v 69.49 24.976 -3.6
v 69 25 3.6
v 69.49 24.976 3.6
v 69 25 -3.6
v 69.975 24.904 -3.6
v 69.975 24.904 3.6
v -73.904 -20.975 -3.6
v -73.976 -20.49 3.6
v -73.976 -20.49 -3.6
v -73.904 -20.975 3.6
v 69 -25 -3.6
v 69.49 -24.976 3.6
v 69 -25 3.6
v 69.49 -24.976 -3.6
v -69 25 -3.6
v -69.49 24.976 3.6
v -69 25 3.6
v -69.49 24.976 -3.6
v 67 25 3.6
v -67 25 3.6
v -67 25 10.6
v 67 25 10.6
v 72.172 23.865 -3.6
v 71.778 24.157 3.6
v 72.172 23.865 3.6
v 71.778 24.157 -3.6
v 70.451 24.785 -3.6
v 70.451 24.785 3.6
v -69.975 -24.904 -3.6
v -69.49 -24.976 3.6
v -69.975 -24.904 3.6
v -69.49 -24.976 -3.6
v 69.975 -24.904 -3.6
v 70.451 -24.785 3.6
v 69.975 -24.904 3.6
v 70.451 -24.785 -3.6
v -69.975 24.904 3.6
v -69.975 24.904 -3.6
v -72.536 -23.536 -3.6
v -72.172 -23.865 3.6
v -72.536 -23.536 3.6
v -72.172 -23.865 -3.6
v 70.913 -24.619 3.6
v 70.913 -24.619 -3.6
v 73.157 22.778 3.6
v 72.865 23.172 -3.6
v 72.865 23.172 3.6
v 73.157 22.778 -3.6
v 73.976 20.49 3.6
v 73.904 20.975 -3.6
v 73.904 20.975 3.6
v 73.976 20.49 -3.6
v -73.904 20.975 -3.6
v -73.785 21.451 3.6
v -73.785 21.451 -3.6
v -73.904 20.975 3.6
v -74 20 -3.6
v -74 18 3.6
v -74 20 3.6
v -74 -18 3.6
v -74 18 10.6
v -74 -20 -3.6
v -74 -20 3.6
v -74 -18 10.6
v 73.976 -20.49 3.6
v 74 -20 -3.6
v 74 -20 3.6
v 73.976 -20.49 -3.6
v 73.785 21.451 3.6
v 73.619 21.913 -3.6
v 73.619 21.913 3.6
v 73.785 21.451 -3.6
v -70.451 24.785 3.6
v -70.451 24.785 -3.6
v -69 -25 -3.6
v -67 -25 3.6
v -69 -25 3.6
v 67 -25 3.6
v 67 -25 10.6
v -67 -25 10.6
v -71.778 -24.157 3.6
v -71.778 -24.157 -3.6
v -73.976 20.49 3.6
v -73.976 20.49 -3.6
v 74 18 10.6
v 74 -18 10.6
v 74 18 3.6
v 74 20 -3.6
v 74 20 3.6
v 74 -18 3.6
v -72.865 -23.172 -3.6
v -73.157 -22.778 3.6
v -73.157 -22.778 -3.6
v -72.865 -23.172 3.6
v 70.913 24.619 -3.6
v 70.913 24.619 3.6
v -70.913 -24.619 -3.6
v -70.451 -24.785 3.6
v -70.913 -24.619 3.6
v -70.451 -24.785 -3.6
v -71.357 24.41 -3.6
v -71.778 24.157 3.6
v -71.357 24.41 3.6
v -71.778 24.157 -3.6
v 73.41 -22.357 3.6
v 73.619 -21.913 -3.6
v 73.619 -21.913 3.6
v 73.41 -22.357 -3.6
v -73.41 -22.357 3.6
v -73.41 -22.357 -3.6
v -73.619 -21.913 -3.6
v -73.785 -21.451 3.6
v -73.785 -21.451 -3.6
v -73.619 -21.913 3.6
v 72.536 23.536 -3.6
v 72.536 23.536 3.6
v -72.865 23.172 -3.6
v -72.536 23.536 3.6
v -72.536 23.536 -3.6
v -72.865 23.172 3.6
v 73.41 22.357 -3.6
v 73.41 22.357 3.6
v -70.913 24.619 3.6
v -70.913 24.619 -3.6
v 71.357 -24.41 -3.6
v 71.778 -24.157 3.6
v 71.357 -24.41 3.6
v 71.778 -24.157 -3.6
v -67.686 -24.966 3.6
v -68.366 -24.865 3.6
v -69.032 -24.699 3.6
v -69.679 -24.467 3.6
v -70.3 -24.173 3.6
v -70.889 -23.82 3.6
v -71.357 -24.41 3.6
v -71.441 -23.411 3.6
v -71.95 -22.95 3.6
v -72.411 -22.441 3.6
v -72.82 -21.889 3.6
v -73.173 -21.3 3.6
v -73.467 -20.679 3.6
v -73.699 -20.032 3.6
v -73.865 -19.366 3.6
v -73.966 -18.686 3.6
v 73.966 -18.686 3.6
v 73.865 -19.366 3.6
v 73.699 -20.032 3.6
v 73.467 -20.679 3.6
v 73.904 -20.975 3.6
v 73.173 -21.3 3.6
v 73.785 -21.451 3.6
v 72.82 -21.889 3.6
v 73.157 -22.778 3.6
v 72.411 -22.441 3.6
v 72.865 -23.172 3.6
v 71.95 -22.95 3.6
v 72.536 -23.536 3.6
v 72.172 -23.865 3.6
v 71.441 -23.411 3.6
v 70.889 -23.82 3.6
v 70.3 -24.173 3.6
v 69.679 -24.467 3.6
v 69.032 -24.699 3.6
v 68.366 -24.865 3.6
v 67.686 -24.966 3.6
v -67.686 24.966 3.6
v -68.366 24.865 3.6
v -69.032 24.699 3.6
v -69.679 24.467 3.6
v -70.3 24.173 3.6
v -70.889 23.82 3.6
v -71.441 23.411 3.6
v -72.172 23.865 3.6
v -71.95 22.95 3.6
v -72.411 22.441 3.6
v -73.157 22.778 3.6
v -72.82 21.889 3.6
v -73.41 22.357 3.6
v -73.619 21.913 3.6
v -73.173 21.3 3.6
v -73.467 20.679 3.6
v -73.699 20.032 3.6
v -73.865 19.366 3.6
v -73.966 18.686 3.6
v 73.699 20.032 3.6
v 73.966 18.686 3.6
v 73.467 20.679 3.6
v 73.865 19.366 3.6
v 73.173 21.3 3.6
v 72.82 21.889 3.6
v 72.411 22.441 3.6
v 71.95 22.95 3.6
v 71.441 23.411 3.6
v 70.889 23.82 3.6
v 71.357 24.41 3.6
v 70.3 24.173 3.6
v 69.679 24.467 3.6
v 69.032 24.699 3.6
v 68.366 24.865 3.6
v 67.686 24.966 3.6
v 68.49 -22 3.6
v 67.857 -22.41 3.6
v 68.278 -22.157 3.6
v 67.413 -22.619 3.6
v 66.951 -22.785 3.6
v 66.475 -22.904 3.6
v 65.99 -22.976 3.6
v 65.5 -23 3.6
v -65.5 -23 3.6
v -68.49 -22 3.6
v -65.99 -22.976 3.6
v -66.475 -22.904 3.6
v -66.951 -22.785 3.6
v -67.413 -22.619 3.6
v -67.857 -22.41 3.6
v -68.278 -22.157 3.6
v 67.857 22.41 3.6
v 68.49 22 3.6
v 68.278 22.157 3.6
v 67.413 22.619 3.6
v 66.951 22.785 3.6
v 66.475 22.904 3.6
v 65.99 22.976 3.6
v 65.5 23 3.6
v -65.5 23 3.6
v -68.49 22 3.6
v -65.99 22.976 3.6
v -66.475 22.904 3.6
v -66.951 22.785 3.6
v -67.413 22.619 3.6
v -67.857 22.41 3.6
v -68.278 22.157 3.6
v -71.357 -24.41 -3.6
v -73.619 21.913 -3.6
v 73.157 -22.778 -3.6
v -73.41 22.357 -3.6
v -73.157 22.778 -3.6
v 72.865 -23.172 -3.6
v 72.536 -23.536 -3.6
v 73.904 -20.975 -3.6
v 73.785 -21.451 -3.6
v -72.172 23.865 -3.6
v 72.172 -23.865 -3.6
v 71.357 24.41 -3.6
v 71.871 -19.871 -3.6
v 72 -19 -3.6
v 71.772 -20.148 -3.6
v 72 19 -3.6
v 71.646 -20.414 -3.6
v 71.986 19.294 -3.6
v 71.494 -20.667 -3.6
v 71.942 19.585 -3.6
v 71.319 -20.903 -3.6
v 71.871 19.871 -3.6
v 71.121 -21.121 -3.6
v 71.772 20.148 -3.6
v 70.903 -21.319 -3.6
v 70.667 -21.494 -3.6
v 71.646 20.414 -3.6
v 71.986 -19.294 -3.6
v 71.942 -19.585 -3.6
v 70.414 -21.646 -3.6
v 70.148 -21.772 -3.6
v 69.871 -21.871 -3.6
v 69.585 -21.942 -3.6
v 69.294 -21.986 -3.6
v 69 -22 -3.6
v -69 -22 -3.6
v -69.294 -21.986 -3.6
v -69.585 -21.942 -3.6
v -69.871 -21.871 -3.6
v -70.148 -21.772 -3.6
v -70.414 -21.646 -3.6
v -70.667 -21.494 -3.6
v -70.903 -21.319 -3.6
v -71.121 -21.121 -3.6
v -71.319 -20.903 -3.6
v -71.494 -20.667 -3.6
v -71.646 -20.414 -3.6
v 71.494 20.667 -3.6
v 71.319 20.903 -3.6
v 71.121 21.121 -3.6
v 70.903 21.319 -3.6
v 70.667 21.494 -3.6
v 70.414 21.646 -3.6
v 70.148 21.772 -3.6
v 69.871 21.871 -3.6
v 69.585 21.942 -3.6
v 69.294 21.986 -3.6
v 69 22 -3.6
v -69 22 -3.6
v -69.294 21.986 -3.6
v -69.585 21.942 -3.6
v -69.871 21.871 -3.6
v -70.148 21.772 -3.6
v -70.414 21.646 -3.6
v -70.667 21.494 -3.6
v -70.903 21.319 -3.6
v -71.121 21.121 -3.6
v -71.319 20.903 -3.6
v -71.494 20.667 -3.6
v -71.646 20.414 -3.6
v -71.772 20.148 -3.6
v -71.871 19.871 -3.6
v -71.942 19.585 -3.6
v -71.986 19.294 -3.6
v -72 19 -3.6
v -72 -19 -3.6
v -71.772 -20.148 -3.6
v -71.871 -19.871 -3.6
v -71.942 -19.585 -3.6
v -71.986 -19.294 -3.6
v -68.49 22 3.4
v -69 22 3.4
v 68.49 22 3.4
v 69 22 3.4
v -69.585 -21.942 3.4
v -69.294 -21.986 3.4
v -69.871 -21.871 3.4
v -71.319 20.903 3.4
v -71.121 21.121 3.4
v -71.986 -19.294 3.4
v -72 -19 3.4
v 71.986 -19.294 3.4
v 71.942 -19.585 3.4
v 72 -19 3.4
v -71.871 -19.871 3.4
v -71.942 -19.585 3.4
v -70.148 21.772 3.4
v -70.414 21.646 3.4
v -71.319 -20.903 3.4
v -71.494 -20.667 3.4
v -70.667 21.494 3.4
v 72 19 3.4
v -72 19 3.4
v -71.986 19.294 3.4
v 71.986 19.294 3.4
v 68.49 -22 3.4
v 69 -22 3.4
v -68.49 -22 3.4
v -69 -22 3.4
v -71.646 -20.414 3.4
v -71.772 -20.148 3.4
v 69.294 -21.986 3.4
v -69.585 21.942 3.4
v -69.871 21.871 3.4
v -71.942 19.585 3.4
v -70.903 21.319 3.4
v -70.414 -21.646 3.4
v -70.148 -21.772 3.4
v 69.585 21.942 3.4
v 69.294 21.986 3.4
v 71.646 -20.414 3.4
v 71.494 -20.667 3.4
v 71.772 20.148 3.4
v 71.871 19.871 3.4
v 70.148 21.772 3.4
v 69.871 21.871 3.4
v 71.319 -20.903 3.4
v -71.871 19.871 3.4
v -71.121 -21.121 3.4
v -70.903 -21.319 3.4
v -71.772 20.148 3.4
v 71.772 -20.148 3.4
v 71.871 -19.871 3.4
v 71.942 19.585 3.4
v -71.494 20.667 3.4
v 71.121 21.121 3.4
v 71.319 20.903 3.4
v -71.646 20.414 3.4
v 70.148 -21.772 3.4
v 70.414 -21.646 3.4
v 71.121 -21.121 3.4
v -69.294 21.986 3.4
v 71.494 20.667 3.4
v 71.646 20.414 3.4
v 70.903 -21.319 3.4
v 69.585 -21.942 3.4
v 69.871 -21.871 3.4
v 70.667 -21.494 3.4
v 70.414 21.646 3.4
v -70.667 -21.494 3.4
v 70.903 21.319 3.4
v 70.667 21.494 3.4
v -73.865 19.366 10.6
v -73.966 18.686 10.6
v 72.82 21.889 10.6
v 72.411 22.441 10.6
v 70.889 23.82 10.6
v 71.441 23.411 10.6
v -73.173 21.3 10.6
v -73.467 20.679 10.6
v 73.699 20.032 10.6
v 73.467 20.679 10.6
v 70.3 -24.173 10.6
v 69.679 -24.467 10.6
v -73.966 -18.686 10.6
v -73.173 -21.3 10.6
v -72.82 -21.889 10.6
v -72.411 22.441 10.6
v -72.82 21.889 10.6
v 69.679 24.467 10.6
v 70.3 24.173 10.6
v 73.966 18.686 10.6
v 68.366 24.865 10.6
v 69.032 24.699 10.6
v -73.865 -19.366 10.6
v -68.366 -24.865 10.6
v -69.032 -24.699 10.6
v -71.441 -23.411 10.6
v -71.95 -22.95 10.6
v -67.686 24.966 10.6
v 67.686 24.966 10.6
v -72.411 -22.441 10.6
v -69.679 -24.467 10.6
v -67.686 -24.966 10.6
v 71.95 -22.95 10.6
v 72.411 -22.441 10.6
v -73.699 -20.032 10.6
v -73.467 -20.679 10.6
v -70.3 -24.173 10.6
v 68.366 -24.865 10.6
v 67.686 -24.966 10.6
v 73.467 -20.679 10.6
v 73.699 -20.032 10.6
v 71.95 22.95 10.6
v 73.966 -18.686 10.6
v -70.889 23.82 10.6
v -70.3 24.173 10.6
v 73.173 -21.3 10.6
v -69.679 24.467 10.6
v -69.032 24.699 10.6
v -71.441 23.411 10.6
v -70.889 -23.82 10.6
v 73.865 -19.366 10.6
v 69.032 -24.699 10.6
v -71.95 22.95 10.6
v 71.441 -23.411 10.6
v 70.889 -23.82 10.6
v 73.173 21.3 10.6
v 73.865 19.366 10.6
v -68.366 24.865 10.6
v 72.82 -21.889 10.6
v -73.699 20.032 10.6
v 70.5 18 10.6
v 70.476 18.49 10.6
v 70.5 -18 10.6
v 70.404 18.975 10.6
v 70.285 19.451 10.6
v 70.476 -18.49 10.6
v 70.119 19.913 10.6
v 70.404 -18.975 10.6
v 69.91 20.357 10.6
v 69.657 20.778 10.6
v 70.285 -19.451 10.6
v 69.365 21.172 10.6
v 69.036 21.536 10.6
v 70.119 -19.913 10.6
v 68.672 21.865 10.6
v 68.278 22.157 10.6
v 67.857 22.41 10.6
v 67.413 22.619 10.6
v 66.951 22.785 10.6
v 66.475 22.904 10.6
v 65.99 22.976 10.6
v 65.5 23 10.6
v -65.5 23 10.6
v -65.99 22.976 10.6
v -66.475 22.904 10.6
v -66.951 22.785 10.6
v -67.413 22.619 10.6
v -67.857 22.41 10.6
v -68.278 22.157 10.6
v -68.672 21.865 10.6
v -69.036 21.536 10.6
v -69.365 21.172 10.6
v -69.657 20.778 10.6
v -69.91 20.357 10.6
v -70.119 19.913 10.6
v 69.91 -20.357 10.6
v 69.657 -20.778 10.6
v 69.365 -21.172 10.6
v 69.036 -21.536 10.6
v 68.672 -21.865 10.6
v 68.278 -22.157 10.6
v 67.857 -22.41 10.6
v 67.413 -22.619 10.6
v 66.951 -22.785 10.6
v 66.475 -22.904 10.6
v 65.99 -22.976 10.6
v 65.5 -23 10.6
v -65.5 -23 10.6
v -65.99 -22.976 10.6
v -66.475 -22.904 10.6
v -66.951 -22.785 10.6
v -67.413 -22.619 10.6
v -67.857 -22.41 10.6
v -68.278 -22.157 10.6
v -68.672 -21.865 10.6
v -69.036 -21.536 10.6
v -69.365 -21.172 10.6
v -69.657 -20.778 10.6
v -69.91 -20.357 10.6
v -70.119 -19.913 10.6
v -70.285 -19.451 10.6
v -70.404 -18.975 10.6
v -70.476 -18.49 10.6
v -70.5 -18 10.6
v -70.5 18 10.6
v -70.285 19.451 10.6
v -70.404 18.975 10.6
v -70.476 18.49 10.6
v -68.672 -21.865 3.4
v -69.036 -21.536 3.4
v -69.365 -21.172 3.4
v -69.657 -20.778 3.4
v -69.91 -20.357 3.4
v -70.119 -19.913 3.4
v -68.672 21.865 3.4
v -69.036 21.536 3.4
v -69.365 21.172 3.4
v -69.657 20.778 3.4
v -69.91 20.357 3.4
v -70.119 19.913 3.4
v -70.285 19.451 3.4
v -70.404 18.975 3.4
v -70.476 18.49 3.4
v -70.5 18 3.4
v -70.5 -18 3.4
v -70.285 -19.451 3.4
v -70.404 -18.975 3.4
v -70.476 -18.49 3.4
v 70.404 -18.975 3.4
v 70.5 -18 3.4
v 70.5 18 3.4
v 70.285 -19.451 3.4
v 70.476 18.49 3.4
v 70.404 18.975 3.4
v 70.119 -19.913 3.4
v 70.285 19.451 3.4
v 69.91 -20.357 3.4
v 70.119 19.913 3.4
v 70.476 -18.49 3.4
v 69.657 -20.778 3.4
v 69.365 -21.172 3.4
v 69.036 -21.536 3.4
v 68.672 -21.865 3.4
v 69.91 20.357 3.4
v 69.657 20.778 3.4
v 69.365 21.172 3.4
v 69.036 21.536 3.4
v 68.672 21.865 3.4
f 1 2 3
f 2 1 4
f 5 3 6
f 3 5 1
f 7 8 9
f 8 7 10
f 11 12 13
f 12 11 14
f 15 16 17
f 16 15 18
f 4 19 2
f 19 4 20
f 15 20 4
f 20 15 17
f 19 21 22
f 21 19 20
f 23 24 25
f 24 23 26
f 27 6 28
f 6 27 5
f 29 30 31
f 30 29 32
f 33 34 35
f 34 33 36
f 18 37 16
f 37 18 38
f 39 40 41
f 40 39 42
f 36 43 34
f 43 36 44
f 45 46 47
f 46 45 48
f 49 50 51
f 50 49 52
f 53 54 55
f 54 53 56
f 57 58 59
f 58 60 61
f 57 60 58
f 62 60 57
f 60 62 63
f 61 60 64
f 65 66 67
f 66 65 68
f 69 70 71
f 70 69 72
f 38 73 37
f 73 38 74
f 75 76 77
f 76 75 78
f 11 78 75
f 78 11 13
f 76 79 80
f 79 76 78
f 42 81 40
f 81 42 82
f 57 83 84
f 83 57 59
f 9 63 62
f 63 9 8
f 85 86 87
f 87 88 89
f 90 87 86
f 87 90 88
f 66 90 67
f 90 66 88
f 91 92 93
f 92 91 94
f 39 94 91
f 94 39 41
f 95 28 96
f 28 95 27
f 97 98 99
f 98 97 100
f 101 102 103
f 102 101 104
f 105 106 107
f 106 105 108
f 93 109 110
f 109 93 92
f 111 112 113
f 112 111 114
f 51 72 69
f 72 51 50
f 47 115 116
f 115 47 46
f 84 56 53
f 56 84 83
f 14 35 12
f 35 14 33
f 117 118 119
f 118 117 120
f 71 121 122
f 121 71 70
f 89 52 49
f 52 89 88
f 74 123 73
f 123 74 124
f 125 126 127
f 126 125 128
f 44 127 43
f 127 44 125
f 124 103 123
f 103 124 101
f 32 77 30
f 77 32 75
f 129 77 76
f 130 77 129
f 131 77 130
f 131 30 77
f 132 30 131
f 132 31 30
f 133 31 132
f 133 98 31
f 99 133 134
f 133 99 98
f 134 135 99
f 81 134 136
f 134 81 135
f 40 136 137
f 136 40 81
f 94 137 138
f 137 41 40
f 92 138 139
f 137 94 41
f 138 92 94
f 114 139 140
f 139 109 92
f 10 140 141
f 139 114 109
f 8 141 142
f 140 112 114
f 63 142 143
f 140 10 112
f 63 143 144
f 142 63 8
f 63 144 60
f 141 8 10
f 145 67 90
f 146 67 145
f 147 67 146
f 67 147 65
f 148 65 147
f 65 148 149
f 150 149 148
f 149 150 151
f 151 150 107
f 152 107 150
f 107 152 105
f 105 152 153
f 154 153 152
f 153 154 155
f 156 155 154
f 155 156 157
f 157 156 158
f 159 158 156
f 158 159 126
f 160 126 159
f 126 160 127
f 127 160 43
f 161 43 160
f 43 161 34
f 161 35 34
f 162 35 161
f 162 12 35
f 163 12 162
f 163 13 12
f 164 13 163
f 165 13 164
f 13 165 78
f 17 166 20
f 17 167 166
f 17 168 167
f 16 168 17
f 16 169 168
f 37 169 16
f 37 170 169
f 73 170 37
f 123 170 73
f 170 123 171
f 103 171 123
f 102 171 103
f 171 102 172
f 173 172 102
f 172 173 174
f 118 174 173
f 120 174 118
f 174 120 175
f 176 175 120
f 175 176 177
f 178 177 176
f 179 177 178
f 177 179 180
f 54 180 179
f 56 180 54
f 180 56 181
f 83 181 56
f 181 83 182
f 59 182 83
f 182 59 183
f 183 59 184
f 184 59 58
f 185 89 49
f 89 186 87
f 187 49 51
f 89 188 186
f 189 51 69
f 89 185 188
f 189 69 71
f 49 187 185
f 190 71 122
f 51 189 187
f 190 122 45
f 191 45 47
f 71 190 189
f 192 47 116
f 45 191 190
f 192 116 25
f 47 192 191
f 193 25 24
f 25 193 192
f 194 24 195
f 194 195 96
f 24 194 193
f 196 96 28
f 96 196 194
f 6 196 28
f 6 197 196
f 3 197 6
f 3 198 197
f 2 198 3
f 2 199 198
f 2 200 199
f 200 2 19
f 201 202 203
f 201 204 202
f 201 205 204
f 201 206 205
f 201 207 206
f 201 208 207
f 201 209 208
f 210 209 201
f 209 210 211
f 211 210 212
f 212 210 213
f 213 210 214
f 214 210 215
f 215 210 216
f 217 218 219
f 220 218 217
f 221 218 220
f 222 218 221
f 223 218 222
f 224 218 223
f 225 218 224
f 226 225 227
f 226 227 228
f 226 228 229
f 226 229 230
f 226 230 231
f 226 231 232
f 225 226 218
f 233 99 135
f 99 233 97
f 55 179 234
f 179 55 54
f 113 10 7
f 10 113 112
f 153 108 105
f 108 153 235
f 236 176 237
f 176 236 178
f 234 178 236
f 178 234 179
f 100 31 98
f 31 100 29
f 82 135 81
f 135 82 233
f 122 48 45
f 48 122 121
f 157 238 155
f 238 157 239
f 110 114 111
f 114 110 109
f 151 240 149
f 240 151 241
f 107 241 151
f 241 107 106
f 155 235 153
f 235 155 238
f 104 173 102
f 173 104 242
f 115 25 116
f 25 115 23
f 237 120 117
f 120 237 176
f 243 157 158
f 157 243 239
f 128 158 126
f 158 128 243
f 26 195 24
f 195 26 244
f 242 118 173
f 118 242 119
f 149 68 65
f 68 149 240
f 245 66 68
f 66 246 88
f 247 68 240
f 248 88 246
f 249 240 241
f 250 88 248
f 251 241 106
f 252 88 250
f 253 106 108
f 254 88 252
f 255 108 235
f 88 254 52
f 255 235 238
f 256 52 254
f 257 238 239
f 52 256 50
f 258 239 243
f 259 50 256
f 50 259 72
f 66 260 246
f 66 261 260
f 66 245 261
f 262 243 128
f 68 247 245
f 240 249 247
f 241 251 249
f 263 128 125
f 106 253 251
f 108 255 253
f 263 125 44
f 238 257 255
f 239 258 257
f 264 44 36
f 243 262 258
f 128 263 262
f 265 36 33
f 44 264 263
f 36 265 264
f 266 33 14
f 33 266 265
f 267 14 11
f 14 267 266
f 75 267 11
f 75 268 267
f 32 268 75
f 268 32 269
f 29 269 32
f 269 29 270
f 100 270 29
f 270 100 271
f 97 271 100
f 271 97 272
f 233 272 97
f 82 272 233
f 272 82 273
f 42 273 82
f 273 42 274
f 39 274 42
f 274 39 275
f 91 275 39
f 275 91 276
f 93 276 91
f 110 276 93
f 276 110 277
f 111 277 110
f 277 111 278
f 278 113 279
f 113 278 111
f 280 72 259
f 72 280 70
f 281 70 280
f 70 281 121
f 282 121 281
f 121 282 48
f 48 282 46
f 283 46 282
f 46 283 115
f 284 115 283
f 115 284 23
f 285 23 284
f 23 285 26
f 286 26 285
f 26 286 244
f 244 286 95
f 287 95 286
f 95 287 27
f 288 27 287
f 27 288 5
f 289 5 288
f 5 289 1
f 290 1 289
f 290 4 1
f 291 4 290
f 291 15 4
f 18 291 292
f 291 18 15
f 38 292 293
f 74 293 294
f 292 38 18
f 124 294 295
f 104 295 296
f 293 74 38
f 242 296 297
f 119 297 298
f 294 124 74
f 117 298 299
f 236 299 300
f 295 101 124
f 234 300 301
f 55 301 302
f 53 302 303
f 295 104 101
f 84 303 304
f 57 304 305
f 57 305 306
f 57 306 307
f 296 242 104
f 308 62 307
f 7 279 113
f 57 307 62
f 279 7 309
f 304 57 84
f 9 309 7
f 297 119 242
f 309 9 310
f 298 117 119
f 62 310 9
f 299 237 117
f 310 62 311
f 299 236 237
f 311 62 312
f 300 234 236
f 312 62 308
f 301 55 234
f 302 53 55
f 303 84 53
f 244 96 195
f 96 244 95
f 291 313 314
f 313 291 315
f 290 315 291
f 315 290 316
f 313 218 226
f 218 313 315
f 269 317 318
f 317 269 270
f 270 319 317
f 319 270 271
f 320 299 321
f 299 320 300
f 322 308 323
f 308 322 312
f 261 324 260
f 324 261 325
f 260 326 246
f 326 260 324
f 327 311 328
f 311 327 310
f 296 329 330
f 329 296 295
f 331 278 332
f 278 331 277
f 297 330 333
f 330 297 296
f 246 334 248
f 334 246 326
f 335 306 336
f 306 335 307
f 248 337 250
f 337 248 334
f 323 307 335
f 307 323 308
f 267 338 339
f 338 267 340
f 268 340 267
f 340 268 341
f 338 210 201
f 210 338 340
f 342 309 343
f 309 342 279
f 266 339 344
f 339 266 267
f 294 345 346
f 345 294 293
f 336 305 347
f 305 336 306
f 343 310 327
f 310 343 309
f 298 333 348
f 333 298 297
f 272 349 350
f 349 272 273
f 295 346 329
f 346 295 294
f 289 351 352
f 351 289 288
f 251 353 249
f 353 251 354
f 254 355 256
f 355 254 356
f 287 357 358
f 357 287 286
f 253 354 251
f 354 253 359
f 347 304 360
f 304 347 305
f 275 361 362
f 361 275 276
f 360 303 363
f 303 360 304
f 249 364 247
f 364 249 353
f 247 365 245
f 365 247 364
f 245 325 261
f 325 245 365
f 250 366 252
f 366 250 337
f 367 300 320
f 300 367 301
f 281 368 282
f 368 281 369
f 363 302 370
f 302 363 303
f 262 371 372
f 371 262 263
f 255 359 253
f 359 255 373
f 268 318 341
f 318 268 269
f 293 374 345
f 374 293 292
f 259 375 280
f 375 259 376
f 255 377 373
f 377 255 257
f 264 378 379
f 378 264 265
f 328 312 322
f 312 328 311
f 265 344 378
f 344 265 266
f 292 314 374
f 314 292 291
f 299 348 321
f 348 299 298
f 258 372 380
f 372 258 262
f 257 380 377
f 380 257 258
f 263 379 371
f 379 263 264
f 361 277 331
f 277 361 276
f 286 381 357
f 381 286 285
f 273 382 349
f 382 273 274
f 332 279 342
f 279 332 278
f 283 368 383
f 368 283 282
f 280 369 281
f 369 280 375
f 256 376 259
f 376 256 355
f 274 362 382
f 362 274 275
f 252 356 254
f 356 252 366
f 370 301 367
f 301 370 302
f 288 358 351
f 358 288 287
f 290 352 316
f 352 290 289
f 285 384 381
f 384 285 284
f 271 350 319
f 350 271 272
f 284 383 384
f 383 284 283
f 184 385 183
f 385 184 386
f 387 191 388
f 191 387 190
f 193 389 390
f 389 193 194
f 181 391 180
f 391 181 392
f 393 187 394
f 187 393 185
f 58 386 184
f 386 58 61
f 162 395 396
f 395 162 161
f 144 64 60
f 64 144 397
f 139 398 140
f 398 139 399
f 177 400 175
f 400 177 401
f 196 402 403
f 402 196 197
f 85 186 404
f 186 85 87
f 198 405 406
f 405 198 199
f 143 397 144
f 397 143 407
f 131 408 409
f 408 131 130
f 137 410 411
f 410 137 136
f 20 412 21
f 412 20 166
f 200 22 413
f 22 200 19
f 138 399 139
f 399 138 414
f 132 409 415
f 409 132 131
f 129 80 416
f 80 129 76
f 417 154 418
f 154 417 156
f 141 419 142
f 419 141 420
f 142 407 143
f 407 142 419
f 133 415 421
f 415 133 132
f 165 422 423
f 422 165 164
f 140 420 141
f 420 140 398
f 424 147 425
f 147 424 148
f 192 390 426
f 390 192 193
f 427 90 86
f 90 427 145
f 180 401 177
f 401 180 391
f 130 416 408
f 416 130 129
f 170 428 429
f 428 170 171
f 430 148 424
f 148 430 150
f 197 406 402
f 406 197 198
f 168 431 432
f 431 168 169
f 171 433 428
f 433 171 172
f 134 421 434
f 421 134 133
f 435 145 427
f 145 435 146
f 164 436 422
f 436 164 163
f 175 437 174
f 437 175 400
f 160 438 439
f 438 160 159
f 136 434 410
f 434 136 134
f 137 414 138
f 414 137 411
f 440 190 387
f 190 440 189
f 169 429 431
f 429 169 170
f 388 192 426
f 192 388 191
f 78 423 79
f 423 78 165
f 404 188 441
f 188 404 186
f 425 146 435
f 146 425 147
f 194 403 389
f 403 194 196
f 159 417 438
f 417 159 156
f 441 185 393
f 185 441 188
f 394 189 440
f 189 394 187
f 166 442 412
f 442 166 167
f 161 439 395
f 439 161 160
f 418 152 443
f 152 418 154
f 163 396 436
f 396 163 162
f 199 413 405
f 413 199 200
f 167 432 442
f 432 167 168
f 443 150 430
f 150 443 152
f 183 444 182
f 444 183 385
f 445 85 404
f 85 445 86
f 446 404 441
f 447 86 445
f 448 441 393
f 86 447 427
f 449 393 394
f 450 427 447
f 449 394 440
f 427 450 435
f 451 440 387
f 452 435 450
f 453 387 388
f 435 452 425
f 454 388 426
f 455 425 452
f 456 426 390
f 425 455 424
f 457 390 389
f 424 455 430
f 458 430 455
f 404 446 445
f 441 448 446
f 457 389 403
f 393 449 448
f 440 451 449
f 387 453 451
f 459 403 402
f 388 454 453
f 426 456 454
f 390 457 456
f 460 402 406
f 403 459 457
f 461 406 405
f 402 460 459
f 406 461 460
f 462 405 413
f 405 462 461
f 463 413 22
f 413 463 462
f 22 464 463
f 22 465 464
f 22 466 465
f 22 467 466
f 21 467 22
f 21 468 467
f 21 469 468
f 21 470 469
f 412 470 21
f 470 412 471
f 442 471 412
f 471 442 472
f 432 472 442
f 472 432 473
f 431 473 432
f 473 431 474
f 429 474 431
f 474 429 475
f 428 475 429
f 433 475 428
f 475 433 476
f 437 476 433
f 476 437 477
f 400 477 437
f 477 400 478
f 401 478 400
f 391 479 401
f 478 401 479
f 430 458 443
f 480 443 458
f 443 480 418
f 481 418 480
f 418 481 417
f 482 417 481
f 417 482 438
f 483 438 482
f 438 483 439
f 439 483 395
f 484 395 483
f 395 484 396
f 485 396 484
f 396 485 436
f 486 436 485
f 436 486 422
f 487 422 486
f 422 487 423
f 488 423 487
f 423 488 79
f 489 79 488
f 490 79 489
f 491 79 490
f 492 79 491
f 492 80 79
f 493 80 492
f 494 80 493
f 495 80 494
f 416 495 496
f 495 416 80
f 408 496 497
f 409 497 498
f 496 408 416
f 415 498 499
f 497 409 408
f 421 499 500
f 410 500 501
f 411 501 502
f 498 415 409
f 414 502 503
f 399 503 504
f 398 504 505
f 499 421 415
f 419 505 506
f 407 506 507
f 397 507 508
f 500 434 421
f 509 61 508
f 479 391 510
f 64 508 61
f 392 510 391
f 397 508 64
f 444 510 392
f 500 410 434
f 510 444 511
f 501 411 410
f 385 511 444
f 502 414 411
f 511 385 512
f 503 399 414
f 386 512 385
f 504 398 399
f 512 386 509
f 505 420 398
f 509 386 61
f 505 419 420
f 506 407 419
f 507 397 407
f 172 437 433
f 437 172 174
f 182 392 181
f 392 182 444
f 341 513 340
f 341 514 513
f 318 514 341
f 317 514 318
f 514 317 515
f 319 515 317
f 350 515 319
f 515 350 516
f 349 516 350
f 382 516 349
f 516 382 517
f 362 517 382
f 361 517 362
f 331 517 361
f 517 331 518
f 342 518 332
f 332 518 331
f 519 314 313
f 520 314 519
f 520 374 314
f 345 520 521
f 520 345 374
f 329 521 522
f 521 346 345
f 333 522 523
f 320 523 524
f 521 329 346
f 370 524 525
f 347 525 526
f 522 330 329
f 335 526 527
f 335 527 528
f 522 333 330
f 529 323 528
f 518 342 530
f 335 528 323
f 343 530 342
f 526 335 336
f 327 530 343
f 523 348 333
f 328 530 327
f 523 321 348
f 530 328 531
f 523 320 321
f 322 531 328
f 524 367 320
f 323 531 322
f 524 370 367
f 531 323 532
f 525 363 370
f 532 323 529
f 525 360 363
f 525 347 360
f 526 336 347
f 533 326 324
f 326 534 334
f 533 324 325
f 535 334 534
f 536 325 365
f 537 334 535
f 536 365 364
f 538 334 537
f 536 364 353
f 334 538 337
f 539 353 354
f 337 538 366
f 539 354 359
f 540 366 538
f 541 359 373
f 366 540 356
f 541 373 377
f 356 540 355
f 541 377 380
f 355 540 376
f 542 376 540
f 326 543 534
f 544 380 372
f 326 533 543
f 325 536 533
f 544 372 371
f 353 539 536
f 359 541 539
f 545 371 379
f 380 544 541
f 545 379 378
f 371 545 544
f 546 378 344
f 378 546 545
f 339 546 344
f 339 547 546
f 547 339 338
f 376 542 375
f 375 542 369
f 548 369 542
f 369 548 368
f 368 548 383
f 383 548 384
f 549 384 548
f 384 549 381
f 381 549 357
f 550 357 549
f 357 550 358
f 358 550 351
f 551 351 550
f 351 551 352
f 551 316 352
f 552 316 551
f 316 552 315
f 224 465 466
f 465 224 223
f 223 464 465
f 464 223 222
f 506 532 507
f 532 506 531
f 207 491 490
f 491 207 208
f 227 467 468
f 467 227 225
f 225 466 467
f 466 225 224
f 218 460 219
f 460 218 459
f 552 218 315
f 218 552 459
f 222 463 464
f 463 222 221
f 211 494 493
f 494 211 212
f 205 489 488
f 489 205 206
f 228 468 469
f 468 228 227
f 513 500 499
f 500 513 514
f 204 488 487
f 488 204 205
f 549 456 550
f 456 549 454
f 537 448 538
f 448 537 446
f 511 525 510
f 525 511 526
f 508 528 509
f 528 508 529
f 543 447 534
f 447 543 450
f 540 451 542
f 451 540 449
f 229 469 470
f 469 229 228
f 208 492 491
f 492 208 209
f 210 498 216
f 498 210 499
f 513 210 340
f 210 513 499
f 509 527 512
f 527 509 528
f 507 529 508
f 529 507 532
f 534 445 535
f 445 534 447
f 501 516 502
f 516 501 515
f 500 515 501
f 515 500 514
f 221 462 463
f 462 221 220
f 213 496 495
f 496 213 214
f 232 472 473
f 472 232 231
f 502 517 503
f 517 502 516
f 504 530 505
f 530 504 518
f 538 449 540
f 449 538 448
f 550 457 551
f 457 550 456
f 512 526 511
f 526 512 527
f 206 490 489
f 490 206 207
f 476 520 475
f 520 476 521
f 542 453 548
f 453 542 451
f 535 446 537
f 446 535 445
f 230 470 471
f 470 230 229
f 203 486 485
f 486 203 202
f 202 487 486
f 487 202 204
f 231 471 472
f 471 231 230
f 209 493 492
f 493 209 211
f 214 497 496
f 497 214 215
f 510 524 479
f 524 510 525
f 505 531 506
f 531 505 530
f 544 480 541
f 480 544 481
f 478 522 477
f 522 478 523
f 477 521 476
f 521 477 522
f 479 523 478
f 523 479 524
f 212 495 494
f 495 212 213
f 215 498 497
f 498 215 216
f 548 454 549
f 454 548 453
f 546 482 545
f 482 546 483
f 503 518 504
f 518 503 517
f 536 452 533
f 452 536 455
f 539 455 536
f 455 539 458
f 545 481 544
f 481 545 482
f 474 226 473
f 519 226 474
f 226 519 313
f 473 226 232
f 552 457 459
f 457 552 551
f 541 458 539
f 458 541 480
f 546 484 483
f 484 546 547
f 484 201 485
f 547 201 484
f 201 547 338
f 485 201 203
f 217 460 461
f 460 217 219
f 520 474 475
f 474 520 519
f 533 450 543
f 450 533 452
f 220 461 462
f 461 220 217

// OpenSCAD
// $fn = 128;
$fn = 64;
//$fn = 32;
//$fn = 16;

thickness = 2;
vent_corner_radius = 5;
vent_width = 141;
vent_height = 46;

dash_corner_radius = 3;
dash_width = 144;
dash_height = 44;

depth = 7;

module housing(width, height, depth, corner_radius) {
  hull()
    for (i = [0,1]) for (j = [0, 1]) mirror([i, 0, 0]) mirror([0, j, 0])
      translate([width / 2 - corner_radius, height / 2 - corner_radius, 0])
        cylinder(h = depth + 0.2, r = corner_radius, center = true);
}

difference() {
  housing(dash_width + (2 * thickness), vent_height + (2 * thickness), depth, dash_corner_radius + thickness);
  housing(dash_width, dash_height, depth + 0.2, dash_corner_radius);
}


translate([0, 0, depth]) difference() {
  housing(dash_width + (2 * thickness), vent_height + (2 * thickness), depth, vent_corner_radius + thickness);
  housing(vent_width, vent_height, depth + 0.2, vent_corner_radius);
}

/*
translate([0, 0, depth]) difference() {
  housing(vent_width + (2 * thickness), vent_height + (2 * thickness), depth, vent_corner_radius + thickness);
  housing(vent_width, vent_height, depth + 0.2, vent_corner_radius);
}
*/
